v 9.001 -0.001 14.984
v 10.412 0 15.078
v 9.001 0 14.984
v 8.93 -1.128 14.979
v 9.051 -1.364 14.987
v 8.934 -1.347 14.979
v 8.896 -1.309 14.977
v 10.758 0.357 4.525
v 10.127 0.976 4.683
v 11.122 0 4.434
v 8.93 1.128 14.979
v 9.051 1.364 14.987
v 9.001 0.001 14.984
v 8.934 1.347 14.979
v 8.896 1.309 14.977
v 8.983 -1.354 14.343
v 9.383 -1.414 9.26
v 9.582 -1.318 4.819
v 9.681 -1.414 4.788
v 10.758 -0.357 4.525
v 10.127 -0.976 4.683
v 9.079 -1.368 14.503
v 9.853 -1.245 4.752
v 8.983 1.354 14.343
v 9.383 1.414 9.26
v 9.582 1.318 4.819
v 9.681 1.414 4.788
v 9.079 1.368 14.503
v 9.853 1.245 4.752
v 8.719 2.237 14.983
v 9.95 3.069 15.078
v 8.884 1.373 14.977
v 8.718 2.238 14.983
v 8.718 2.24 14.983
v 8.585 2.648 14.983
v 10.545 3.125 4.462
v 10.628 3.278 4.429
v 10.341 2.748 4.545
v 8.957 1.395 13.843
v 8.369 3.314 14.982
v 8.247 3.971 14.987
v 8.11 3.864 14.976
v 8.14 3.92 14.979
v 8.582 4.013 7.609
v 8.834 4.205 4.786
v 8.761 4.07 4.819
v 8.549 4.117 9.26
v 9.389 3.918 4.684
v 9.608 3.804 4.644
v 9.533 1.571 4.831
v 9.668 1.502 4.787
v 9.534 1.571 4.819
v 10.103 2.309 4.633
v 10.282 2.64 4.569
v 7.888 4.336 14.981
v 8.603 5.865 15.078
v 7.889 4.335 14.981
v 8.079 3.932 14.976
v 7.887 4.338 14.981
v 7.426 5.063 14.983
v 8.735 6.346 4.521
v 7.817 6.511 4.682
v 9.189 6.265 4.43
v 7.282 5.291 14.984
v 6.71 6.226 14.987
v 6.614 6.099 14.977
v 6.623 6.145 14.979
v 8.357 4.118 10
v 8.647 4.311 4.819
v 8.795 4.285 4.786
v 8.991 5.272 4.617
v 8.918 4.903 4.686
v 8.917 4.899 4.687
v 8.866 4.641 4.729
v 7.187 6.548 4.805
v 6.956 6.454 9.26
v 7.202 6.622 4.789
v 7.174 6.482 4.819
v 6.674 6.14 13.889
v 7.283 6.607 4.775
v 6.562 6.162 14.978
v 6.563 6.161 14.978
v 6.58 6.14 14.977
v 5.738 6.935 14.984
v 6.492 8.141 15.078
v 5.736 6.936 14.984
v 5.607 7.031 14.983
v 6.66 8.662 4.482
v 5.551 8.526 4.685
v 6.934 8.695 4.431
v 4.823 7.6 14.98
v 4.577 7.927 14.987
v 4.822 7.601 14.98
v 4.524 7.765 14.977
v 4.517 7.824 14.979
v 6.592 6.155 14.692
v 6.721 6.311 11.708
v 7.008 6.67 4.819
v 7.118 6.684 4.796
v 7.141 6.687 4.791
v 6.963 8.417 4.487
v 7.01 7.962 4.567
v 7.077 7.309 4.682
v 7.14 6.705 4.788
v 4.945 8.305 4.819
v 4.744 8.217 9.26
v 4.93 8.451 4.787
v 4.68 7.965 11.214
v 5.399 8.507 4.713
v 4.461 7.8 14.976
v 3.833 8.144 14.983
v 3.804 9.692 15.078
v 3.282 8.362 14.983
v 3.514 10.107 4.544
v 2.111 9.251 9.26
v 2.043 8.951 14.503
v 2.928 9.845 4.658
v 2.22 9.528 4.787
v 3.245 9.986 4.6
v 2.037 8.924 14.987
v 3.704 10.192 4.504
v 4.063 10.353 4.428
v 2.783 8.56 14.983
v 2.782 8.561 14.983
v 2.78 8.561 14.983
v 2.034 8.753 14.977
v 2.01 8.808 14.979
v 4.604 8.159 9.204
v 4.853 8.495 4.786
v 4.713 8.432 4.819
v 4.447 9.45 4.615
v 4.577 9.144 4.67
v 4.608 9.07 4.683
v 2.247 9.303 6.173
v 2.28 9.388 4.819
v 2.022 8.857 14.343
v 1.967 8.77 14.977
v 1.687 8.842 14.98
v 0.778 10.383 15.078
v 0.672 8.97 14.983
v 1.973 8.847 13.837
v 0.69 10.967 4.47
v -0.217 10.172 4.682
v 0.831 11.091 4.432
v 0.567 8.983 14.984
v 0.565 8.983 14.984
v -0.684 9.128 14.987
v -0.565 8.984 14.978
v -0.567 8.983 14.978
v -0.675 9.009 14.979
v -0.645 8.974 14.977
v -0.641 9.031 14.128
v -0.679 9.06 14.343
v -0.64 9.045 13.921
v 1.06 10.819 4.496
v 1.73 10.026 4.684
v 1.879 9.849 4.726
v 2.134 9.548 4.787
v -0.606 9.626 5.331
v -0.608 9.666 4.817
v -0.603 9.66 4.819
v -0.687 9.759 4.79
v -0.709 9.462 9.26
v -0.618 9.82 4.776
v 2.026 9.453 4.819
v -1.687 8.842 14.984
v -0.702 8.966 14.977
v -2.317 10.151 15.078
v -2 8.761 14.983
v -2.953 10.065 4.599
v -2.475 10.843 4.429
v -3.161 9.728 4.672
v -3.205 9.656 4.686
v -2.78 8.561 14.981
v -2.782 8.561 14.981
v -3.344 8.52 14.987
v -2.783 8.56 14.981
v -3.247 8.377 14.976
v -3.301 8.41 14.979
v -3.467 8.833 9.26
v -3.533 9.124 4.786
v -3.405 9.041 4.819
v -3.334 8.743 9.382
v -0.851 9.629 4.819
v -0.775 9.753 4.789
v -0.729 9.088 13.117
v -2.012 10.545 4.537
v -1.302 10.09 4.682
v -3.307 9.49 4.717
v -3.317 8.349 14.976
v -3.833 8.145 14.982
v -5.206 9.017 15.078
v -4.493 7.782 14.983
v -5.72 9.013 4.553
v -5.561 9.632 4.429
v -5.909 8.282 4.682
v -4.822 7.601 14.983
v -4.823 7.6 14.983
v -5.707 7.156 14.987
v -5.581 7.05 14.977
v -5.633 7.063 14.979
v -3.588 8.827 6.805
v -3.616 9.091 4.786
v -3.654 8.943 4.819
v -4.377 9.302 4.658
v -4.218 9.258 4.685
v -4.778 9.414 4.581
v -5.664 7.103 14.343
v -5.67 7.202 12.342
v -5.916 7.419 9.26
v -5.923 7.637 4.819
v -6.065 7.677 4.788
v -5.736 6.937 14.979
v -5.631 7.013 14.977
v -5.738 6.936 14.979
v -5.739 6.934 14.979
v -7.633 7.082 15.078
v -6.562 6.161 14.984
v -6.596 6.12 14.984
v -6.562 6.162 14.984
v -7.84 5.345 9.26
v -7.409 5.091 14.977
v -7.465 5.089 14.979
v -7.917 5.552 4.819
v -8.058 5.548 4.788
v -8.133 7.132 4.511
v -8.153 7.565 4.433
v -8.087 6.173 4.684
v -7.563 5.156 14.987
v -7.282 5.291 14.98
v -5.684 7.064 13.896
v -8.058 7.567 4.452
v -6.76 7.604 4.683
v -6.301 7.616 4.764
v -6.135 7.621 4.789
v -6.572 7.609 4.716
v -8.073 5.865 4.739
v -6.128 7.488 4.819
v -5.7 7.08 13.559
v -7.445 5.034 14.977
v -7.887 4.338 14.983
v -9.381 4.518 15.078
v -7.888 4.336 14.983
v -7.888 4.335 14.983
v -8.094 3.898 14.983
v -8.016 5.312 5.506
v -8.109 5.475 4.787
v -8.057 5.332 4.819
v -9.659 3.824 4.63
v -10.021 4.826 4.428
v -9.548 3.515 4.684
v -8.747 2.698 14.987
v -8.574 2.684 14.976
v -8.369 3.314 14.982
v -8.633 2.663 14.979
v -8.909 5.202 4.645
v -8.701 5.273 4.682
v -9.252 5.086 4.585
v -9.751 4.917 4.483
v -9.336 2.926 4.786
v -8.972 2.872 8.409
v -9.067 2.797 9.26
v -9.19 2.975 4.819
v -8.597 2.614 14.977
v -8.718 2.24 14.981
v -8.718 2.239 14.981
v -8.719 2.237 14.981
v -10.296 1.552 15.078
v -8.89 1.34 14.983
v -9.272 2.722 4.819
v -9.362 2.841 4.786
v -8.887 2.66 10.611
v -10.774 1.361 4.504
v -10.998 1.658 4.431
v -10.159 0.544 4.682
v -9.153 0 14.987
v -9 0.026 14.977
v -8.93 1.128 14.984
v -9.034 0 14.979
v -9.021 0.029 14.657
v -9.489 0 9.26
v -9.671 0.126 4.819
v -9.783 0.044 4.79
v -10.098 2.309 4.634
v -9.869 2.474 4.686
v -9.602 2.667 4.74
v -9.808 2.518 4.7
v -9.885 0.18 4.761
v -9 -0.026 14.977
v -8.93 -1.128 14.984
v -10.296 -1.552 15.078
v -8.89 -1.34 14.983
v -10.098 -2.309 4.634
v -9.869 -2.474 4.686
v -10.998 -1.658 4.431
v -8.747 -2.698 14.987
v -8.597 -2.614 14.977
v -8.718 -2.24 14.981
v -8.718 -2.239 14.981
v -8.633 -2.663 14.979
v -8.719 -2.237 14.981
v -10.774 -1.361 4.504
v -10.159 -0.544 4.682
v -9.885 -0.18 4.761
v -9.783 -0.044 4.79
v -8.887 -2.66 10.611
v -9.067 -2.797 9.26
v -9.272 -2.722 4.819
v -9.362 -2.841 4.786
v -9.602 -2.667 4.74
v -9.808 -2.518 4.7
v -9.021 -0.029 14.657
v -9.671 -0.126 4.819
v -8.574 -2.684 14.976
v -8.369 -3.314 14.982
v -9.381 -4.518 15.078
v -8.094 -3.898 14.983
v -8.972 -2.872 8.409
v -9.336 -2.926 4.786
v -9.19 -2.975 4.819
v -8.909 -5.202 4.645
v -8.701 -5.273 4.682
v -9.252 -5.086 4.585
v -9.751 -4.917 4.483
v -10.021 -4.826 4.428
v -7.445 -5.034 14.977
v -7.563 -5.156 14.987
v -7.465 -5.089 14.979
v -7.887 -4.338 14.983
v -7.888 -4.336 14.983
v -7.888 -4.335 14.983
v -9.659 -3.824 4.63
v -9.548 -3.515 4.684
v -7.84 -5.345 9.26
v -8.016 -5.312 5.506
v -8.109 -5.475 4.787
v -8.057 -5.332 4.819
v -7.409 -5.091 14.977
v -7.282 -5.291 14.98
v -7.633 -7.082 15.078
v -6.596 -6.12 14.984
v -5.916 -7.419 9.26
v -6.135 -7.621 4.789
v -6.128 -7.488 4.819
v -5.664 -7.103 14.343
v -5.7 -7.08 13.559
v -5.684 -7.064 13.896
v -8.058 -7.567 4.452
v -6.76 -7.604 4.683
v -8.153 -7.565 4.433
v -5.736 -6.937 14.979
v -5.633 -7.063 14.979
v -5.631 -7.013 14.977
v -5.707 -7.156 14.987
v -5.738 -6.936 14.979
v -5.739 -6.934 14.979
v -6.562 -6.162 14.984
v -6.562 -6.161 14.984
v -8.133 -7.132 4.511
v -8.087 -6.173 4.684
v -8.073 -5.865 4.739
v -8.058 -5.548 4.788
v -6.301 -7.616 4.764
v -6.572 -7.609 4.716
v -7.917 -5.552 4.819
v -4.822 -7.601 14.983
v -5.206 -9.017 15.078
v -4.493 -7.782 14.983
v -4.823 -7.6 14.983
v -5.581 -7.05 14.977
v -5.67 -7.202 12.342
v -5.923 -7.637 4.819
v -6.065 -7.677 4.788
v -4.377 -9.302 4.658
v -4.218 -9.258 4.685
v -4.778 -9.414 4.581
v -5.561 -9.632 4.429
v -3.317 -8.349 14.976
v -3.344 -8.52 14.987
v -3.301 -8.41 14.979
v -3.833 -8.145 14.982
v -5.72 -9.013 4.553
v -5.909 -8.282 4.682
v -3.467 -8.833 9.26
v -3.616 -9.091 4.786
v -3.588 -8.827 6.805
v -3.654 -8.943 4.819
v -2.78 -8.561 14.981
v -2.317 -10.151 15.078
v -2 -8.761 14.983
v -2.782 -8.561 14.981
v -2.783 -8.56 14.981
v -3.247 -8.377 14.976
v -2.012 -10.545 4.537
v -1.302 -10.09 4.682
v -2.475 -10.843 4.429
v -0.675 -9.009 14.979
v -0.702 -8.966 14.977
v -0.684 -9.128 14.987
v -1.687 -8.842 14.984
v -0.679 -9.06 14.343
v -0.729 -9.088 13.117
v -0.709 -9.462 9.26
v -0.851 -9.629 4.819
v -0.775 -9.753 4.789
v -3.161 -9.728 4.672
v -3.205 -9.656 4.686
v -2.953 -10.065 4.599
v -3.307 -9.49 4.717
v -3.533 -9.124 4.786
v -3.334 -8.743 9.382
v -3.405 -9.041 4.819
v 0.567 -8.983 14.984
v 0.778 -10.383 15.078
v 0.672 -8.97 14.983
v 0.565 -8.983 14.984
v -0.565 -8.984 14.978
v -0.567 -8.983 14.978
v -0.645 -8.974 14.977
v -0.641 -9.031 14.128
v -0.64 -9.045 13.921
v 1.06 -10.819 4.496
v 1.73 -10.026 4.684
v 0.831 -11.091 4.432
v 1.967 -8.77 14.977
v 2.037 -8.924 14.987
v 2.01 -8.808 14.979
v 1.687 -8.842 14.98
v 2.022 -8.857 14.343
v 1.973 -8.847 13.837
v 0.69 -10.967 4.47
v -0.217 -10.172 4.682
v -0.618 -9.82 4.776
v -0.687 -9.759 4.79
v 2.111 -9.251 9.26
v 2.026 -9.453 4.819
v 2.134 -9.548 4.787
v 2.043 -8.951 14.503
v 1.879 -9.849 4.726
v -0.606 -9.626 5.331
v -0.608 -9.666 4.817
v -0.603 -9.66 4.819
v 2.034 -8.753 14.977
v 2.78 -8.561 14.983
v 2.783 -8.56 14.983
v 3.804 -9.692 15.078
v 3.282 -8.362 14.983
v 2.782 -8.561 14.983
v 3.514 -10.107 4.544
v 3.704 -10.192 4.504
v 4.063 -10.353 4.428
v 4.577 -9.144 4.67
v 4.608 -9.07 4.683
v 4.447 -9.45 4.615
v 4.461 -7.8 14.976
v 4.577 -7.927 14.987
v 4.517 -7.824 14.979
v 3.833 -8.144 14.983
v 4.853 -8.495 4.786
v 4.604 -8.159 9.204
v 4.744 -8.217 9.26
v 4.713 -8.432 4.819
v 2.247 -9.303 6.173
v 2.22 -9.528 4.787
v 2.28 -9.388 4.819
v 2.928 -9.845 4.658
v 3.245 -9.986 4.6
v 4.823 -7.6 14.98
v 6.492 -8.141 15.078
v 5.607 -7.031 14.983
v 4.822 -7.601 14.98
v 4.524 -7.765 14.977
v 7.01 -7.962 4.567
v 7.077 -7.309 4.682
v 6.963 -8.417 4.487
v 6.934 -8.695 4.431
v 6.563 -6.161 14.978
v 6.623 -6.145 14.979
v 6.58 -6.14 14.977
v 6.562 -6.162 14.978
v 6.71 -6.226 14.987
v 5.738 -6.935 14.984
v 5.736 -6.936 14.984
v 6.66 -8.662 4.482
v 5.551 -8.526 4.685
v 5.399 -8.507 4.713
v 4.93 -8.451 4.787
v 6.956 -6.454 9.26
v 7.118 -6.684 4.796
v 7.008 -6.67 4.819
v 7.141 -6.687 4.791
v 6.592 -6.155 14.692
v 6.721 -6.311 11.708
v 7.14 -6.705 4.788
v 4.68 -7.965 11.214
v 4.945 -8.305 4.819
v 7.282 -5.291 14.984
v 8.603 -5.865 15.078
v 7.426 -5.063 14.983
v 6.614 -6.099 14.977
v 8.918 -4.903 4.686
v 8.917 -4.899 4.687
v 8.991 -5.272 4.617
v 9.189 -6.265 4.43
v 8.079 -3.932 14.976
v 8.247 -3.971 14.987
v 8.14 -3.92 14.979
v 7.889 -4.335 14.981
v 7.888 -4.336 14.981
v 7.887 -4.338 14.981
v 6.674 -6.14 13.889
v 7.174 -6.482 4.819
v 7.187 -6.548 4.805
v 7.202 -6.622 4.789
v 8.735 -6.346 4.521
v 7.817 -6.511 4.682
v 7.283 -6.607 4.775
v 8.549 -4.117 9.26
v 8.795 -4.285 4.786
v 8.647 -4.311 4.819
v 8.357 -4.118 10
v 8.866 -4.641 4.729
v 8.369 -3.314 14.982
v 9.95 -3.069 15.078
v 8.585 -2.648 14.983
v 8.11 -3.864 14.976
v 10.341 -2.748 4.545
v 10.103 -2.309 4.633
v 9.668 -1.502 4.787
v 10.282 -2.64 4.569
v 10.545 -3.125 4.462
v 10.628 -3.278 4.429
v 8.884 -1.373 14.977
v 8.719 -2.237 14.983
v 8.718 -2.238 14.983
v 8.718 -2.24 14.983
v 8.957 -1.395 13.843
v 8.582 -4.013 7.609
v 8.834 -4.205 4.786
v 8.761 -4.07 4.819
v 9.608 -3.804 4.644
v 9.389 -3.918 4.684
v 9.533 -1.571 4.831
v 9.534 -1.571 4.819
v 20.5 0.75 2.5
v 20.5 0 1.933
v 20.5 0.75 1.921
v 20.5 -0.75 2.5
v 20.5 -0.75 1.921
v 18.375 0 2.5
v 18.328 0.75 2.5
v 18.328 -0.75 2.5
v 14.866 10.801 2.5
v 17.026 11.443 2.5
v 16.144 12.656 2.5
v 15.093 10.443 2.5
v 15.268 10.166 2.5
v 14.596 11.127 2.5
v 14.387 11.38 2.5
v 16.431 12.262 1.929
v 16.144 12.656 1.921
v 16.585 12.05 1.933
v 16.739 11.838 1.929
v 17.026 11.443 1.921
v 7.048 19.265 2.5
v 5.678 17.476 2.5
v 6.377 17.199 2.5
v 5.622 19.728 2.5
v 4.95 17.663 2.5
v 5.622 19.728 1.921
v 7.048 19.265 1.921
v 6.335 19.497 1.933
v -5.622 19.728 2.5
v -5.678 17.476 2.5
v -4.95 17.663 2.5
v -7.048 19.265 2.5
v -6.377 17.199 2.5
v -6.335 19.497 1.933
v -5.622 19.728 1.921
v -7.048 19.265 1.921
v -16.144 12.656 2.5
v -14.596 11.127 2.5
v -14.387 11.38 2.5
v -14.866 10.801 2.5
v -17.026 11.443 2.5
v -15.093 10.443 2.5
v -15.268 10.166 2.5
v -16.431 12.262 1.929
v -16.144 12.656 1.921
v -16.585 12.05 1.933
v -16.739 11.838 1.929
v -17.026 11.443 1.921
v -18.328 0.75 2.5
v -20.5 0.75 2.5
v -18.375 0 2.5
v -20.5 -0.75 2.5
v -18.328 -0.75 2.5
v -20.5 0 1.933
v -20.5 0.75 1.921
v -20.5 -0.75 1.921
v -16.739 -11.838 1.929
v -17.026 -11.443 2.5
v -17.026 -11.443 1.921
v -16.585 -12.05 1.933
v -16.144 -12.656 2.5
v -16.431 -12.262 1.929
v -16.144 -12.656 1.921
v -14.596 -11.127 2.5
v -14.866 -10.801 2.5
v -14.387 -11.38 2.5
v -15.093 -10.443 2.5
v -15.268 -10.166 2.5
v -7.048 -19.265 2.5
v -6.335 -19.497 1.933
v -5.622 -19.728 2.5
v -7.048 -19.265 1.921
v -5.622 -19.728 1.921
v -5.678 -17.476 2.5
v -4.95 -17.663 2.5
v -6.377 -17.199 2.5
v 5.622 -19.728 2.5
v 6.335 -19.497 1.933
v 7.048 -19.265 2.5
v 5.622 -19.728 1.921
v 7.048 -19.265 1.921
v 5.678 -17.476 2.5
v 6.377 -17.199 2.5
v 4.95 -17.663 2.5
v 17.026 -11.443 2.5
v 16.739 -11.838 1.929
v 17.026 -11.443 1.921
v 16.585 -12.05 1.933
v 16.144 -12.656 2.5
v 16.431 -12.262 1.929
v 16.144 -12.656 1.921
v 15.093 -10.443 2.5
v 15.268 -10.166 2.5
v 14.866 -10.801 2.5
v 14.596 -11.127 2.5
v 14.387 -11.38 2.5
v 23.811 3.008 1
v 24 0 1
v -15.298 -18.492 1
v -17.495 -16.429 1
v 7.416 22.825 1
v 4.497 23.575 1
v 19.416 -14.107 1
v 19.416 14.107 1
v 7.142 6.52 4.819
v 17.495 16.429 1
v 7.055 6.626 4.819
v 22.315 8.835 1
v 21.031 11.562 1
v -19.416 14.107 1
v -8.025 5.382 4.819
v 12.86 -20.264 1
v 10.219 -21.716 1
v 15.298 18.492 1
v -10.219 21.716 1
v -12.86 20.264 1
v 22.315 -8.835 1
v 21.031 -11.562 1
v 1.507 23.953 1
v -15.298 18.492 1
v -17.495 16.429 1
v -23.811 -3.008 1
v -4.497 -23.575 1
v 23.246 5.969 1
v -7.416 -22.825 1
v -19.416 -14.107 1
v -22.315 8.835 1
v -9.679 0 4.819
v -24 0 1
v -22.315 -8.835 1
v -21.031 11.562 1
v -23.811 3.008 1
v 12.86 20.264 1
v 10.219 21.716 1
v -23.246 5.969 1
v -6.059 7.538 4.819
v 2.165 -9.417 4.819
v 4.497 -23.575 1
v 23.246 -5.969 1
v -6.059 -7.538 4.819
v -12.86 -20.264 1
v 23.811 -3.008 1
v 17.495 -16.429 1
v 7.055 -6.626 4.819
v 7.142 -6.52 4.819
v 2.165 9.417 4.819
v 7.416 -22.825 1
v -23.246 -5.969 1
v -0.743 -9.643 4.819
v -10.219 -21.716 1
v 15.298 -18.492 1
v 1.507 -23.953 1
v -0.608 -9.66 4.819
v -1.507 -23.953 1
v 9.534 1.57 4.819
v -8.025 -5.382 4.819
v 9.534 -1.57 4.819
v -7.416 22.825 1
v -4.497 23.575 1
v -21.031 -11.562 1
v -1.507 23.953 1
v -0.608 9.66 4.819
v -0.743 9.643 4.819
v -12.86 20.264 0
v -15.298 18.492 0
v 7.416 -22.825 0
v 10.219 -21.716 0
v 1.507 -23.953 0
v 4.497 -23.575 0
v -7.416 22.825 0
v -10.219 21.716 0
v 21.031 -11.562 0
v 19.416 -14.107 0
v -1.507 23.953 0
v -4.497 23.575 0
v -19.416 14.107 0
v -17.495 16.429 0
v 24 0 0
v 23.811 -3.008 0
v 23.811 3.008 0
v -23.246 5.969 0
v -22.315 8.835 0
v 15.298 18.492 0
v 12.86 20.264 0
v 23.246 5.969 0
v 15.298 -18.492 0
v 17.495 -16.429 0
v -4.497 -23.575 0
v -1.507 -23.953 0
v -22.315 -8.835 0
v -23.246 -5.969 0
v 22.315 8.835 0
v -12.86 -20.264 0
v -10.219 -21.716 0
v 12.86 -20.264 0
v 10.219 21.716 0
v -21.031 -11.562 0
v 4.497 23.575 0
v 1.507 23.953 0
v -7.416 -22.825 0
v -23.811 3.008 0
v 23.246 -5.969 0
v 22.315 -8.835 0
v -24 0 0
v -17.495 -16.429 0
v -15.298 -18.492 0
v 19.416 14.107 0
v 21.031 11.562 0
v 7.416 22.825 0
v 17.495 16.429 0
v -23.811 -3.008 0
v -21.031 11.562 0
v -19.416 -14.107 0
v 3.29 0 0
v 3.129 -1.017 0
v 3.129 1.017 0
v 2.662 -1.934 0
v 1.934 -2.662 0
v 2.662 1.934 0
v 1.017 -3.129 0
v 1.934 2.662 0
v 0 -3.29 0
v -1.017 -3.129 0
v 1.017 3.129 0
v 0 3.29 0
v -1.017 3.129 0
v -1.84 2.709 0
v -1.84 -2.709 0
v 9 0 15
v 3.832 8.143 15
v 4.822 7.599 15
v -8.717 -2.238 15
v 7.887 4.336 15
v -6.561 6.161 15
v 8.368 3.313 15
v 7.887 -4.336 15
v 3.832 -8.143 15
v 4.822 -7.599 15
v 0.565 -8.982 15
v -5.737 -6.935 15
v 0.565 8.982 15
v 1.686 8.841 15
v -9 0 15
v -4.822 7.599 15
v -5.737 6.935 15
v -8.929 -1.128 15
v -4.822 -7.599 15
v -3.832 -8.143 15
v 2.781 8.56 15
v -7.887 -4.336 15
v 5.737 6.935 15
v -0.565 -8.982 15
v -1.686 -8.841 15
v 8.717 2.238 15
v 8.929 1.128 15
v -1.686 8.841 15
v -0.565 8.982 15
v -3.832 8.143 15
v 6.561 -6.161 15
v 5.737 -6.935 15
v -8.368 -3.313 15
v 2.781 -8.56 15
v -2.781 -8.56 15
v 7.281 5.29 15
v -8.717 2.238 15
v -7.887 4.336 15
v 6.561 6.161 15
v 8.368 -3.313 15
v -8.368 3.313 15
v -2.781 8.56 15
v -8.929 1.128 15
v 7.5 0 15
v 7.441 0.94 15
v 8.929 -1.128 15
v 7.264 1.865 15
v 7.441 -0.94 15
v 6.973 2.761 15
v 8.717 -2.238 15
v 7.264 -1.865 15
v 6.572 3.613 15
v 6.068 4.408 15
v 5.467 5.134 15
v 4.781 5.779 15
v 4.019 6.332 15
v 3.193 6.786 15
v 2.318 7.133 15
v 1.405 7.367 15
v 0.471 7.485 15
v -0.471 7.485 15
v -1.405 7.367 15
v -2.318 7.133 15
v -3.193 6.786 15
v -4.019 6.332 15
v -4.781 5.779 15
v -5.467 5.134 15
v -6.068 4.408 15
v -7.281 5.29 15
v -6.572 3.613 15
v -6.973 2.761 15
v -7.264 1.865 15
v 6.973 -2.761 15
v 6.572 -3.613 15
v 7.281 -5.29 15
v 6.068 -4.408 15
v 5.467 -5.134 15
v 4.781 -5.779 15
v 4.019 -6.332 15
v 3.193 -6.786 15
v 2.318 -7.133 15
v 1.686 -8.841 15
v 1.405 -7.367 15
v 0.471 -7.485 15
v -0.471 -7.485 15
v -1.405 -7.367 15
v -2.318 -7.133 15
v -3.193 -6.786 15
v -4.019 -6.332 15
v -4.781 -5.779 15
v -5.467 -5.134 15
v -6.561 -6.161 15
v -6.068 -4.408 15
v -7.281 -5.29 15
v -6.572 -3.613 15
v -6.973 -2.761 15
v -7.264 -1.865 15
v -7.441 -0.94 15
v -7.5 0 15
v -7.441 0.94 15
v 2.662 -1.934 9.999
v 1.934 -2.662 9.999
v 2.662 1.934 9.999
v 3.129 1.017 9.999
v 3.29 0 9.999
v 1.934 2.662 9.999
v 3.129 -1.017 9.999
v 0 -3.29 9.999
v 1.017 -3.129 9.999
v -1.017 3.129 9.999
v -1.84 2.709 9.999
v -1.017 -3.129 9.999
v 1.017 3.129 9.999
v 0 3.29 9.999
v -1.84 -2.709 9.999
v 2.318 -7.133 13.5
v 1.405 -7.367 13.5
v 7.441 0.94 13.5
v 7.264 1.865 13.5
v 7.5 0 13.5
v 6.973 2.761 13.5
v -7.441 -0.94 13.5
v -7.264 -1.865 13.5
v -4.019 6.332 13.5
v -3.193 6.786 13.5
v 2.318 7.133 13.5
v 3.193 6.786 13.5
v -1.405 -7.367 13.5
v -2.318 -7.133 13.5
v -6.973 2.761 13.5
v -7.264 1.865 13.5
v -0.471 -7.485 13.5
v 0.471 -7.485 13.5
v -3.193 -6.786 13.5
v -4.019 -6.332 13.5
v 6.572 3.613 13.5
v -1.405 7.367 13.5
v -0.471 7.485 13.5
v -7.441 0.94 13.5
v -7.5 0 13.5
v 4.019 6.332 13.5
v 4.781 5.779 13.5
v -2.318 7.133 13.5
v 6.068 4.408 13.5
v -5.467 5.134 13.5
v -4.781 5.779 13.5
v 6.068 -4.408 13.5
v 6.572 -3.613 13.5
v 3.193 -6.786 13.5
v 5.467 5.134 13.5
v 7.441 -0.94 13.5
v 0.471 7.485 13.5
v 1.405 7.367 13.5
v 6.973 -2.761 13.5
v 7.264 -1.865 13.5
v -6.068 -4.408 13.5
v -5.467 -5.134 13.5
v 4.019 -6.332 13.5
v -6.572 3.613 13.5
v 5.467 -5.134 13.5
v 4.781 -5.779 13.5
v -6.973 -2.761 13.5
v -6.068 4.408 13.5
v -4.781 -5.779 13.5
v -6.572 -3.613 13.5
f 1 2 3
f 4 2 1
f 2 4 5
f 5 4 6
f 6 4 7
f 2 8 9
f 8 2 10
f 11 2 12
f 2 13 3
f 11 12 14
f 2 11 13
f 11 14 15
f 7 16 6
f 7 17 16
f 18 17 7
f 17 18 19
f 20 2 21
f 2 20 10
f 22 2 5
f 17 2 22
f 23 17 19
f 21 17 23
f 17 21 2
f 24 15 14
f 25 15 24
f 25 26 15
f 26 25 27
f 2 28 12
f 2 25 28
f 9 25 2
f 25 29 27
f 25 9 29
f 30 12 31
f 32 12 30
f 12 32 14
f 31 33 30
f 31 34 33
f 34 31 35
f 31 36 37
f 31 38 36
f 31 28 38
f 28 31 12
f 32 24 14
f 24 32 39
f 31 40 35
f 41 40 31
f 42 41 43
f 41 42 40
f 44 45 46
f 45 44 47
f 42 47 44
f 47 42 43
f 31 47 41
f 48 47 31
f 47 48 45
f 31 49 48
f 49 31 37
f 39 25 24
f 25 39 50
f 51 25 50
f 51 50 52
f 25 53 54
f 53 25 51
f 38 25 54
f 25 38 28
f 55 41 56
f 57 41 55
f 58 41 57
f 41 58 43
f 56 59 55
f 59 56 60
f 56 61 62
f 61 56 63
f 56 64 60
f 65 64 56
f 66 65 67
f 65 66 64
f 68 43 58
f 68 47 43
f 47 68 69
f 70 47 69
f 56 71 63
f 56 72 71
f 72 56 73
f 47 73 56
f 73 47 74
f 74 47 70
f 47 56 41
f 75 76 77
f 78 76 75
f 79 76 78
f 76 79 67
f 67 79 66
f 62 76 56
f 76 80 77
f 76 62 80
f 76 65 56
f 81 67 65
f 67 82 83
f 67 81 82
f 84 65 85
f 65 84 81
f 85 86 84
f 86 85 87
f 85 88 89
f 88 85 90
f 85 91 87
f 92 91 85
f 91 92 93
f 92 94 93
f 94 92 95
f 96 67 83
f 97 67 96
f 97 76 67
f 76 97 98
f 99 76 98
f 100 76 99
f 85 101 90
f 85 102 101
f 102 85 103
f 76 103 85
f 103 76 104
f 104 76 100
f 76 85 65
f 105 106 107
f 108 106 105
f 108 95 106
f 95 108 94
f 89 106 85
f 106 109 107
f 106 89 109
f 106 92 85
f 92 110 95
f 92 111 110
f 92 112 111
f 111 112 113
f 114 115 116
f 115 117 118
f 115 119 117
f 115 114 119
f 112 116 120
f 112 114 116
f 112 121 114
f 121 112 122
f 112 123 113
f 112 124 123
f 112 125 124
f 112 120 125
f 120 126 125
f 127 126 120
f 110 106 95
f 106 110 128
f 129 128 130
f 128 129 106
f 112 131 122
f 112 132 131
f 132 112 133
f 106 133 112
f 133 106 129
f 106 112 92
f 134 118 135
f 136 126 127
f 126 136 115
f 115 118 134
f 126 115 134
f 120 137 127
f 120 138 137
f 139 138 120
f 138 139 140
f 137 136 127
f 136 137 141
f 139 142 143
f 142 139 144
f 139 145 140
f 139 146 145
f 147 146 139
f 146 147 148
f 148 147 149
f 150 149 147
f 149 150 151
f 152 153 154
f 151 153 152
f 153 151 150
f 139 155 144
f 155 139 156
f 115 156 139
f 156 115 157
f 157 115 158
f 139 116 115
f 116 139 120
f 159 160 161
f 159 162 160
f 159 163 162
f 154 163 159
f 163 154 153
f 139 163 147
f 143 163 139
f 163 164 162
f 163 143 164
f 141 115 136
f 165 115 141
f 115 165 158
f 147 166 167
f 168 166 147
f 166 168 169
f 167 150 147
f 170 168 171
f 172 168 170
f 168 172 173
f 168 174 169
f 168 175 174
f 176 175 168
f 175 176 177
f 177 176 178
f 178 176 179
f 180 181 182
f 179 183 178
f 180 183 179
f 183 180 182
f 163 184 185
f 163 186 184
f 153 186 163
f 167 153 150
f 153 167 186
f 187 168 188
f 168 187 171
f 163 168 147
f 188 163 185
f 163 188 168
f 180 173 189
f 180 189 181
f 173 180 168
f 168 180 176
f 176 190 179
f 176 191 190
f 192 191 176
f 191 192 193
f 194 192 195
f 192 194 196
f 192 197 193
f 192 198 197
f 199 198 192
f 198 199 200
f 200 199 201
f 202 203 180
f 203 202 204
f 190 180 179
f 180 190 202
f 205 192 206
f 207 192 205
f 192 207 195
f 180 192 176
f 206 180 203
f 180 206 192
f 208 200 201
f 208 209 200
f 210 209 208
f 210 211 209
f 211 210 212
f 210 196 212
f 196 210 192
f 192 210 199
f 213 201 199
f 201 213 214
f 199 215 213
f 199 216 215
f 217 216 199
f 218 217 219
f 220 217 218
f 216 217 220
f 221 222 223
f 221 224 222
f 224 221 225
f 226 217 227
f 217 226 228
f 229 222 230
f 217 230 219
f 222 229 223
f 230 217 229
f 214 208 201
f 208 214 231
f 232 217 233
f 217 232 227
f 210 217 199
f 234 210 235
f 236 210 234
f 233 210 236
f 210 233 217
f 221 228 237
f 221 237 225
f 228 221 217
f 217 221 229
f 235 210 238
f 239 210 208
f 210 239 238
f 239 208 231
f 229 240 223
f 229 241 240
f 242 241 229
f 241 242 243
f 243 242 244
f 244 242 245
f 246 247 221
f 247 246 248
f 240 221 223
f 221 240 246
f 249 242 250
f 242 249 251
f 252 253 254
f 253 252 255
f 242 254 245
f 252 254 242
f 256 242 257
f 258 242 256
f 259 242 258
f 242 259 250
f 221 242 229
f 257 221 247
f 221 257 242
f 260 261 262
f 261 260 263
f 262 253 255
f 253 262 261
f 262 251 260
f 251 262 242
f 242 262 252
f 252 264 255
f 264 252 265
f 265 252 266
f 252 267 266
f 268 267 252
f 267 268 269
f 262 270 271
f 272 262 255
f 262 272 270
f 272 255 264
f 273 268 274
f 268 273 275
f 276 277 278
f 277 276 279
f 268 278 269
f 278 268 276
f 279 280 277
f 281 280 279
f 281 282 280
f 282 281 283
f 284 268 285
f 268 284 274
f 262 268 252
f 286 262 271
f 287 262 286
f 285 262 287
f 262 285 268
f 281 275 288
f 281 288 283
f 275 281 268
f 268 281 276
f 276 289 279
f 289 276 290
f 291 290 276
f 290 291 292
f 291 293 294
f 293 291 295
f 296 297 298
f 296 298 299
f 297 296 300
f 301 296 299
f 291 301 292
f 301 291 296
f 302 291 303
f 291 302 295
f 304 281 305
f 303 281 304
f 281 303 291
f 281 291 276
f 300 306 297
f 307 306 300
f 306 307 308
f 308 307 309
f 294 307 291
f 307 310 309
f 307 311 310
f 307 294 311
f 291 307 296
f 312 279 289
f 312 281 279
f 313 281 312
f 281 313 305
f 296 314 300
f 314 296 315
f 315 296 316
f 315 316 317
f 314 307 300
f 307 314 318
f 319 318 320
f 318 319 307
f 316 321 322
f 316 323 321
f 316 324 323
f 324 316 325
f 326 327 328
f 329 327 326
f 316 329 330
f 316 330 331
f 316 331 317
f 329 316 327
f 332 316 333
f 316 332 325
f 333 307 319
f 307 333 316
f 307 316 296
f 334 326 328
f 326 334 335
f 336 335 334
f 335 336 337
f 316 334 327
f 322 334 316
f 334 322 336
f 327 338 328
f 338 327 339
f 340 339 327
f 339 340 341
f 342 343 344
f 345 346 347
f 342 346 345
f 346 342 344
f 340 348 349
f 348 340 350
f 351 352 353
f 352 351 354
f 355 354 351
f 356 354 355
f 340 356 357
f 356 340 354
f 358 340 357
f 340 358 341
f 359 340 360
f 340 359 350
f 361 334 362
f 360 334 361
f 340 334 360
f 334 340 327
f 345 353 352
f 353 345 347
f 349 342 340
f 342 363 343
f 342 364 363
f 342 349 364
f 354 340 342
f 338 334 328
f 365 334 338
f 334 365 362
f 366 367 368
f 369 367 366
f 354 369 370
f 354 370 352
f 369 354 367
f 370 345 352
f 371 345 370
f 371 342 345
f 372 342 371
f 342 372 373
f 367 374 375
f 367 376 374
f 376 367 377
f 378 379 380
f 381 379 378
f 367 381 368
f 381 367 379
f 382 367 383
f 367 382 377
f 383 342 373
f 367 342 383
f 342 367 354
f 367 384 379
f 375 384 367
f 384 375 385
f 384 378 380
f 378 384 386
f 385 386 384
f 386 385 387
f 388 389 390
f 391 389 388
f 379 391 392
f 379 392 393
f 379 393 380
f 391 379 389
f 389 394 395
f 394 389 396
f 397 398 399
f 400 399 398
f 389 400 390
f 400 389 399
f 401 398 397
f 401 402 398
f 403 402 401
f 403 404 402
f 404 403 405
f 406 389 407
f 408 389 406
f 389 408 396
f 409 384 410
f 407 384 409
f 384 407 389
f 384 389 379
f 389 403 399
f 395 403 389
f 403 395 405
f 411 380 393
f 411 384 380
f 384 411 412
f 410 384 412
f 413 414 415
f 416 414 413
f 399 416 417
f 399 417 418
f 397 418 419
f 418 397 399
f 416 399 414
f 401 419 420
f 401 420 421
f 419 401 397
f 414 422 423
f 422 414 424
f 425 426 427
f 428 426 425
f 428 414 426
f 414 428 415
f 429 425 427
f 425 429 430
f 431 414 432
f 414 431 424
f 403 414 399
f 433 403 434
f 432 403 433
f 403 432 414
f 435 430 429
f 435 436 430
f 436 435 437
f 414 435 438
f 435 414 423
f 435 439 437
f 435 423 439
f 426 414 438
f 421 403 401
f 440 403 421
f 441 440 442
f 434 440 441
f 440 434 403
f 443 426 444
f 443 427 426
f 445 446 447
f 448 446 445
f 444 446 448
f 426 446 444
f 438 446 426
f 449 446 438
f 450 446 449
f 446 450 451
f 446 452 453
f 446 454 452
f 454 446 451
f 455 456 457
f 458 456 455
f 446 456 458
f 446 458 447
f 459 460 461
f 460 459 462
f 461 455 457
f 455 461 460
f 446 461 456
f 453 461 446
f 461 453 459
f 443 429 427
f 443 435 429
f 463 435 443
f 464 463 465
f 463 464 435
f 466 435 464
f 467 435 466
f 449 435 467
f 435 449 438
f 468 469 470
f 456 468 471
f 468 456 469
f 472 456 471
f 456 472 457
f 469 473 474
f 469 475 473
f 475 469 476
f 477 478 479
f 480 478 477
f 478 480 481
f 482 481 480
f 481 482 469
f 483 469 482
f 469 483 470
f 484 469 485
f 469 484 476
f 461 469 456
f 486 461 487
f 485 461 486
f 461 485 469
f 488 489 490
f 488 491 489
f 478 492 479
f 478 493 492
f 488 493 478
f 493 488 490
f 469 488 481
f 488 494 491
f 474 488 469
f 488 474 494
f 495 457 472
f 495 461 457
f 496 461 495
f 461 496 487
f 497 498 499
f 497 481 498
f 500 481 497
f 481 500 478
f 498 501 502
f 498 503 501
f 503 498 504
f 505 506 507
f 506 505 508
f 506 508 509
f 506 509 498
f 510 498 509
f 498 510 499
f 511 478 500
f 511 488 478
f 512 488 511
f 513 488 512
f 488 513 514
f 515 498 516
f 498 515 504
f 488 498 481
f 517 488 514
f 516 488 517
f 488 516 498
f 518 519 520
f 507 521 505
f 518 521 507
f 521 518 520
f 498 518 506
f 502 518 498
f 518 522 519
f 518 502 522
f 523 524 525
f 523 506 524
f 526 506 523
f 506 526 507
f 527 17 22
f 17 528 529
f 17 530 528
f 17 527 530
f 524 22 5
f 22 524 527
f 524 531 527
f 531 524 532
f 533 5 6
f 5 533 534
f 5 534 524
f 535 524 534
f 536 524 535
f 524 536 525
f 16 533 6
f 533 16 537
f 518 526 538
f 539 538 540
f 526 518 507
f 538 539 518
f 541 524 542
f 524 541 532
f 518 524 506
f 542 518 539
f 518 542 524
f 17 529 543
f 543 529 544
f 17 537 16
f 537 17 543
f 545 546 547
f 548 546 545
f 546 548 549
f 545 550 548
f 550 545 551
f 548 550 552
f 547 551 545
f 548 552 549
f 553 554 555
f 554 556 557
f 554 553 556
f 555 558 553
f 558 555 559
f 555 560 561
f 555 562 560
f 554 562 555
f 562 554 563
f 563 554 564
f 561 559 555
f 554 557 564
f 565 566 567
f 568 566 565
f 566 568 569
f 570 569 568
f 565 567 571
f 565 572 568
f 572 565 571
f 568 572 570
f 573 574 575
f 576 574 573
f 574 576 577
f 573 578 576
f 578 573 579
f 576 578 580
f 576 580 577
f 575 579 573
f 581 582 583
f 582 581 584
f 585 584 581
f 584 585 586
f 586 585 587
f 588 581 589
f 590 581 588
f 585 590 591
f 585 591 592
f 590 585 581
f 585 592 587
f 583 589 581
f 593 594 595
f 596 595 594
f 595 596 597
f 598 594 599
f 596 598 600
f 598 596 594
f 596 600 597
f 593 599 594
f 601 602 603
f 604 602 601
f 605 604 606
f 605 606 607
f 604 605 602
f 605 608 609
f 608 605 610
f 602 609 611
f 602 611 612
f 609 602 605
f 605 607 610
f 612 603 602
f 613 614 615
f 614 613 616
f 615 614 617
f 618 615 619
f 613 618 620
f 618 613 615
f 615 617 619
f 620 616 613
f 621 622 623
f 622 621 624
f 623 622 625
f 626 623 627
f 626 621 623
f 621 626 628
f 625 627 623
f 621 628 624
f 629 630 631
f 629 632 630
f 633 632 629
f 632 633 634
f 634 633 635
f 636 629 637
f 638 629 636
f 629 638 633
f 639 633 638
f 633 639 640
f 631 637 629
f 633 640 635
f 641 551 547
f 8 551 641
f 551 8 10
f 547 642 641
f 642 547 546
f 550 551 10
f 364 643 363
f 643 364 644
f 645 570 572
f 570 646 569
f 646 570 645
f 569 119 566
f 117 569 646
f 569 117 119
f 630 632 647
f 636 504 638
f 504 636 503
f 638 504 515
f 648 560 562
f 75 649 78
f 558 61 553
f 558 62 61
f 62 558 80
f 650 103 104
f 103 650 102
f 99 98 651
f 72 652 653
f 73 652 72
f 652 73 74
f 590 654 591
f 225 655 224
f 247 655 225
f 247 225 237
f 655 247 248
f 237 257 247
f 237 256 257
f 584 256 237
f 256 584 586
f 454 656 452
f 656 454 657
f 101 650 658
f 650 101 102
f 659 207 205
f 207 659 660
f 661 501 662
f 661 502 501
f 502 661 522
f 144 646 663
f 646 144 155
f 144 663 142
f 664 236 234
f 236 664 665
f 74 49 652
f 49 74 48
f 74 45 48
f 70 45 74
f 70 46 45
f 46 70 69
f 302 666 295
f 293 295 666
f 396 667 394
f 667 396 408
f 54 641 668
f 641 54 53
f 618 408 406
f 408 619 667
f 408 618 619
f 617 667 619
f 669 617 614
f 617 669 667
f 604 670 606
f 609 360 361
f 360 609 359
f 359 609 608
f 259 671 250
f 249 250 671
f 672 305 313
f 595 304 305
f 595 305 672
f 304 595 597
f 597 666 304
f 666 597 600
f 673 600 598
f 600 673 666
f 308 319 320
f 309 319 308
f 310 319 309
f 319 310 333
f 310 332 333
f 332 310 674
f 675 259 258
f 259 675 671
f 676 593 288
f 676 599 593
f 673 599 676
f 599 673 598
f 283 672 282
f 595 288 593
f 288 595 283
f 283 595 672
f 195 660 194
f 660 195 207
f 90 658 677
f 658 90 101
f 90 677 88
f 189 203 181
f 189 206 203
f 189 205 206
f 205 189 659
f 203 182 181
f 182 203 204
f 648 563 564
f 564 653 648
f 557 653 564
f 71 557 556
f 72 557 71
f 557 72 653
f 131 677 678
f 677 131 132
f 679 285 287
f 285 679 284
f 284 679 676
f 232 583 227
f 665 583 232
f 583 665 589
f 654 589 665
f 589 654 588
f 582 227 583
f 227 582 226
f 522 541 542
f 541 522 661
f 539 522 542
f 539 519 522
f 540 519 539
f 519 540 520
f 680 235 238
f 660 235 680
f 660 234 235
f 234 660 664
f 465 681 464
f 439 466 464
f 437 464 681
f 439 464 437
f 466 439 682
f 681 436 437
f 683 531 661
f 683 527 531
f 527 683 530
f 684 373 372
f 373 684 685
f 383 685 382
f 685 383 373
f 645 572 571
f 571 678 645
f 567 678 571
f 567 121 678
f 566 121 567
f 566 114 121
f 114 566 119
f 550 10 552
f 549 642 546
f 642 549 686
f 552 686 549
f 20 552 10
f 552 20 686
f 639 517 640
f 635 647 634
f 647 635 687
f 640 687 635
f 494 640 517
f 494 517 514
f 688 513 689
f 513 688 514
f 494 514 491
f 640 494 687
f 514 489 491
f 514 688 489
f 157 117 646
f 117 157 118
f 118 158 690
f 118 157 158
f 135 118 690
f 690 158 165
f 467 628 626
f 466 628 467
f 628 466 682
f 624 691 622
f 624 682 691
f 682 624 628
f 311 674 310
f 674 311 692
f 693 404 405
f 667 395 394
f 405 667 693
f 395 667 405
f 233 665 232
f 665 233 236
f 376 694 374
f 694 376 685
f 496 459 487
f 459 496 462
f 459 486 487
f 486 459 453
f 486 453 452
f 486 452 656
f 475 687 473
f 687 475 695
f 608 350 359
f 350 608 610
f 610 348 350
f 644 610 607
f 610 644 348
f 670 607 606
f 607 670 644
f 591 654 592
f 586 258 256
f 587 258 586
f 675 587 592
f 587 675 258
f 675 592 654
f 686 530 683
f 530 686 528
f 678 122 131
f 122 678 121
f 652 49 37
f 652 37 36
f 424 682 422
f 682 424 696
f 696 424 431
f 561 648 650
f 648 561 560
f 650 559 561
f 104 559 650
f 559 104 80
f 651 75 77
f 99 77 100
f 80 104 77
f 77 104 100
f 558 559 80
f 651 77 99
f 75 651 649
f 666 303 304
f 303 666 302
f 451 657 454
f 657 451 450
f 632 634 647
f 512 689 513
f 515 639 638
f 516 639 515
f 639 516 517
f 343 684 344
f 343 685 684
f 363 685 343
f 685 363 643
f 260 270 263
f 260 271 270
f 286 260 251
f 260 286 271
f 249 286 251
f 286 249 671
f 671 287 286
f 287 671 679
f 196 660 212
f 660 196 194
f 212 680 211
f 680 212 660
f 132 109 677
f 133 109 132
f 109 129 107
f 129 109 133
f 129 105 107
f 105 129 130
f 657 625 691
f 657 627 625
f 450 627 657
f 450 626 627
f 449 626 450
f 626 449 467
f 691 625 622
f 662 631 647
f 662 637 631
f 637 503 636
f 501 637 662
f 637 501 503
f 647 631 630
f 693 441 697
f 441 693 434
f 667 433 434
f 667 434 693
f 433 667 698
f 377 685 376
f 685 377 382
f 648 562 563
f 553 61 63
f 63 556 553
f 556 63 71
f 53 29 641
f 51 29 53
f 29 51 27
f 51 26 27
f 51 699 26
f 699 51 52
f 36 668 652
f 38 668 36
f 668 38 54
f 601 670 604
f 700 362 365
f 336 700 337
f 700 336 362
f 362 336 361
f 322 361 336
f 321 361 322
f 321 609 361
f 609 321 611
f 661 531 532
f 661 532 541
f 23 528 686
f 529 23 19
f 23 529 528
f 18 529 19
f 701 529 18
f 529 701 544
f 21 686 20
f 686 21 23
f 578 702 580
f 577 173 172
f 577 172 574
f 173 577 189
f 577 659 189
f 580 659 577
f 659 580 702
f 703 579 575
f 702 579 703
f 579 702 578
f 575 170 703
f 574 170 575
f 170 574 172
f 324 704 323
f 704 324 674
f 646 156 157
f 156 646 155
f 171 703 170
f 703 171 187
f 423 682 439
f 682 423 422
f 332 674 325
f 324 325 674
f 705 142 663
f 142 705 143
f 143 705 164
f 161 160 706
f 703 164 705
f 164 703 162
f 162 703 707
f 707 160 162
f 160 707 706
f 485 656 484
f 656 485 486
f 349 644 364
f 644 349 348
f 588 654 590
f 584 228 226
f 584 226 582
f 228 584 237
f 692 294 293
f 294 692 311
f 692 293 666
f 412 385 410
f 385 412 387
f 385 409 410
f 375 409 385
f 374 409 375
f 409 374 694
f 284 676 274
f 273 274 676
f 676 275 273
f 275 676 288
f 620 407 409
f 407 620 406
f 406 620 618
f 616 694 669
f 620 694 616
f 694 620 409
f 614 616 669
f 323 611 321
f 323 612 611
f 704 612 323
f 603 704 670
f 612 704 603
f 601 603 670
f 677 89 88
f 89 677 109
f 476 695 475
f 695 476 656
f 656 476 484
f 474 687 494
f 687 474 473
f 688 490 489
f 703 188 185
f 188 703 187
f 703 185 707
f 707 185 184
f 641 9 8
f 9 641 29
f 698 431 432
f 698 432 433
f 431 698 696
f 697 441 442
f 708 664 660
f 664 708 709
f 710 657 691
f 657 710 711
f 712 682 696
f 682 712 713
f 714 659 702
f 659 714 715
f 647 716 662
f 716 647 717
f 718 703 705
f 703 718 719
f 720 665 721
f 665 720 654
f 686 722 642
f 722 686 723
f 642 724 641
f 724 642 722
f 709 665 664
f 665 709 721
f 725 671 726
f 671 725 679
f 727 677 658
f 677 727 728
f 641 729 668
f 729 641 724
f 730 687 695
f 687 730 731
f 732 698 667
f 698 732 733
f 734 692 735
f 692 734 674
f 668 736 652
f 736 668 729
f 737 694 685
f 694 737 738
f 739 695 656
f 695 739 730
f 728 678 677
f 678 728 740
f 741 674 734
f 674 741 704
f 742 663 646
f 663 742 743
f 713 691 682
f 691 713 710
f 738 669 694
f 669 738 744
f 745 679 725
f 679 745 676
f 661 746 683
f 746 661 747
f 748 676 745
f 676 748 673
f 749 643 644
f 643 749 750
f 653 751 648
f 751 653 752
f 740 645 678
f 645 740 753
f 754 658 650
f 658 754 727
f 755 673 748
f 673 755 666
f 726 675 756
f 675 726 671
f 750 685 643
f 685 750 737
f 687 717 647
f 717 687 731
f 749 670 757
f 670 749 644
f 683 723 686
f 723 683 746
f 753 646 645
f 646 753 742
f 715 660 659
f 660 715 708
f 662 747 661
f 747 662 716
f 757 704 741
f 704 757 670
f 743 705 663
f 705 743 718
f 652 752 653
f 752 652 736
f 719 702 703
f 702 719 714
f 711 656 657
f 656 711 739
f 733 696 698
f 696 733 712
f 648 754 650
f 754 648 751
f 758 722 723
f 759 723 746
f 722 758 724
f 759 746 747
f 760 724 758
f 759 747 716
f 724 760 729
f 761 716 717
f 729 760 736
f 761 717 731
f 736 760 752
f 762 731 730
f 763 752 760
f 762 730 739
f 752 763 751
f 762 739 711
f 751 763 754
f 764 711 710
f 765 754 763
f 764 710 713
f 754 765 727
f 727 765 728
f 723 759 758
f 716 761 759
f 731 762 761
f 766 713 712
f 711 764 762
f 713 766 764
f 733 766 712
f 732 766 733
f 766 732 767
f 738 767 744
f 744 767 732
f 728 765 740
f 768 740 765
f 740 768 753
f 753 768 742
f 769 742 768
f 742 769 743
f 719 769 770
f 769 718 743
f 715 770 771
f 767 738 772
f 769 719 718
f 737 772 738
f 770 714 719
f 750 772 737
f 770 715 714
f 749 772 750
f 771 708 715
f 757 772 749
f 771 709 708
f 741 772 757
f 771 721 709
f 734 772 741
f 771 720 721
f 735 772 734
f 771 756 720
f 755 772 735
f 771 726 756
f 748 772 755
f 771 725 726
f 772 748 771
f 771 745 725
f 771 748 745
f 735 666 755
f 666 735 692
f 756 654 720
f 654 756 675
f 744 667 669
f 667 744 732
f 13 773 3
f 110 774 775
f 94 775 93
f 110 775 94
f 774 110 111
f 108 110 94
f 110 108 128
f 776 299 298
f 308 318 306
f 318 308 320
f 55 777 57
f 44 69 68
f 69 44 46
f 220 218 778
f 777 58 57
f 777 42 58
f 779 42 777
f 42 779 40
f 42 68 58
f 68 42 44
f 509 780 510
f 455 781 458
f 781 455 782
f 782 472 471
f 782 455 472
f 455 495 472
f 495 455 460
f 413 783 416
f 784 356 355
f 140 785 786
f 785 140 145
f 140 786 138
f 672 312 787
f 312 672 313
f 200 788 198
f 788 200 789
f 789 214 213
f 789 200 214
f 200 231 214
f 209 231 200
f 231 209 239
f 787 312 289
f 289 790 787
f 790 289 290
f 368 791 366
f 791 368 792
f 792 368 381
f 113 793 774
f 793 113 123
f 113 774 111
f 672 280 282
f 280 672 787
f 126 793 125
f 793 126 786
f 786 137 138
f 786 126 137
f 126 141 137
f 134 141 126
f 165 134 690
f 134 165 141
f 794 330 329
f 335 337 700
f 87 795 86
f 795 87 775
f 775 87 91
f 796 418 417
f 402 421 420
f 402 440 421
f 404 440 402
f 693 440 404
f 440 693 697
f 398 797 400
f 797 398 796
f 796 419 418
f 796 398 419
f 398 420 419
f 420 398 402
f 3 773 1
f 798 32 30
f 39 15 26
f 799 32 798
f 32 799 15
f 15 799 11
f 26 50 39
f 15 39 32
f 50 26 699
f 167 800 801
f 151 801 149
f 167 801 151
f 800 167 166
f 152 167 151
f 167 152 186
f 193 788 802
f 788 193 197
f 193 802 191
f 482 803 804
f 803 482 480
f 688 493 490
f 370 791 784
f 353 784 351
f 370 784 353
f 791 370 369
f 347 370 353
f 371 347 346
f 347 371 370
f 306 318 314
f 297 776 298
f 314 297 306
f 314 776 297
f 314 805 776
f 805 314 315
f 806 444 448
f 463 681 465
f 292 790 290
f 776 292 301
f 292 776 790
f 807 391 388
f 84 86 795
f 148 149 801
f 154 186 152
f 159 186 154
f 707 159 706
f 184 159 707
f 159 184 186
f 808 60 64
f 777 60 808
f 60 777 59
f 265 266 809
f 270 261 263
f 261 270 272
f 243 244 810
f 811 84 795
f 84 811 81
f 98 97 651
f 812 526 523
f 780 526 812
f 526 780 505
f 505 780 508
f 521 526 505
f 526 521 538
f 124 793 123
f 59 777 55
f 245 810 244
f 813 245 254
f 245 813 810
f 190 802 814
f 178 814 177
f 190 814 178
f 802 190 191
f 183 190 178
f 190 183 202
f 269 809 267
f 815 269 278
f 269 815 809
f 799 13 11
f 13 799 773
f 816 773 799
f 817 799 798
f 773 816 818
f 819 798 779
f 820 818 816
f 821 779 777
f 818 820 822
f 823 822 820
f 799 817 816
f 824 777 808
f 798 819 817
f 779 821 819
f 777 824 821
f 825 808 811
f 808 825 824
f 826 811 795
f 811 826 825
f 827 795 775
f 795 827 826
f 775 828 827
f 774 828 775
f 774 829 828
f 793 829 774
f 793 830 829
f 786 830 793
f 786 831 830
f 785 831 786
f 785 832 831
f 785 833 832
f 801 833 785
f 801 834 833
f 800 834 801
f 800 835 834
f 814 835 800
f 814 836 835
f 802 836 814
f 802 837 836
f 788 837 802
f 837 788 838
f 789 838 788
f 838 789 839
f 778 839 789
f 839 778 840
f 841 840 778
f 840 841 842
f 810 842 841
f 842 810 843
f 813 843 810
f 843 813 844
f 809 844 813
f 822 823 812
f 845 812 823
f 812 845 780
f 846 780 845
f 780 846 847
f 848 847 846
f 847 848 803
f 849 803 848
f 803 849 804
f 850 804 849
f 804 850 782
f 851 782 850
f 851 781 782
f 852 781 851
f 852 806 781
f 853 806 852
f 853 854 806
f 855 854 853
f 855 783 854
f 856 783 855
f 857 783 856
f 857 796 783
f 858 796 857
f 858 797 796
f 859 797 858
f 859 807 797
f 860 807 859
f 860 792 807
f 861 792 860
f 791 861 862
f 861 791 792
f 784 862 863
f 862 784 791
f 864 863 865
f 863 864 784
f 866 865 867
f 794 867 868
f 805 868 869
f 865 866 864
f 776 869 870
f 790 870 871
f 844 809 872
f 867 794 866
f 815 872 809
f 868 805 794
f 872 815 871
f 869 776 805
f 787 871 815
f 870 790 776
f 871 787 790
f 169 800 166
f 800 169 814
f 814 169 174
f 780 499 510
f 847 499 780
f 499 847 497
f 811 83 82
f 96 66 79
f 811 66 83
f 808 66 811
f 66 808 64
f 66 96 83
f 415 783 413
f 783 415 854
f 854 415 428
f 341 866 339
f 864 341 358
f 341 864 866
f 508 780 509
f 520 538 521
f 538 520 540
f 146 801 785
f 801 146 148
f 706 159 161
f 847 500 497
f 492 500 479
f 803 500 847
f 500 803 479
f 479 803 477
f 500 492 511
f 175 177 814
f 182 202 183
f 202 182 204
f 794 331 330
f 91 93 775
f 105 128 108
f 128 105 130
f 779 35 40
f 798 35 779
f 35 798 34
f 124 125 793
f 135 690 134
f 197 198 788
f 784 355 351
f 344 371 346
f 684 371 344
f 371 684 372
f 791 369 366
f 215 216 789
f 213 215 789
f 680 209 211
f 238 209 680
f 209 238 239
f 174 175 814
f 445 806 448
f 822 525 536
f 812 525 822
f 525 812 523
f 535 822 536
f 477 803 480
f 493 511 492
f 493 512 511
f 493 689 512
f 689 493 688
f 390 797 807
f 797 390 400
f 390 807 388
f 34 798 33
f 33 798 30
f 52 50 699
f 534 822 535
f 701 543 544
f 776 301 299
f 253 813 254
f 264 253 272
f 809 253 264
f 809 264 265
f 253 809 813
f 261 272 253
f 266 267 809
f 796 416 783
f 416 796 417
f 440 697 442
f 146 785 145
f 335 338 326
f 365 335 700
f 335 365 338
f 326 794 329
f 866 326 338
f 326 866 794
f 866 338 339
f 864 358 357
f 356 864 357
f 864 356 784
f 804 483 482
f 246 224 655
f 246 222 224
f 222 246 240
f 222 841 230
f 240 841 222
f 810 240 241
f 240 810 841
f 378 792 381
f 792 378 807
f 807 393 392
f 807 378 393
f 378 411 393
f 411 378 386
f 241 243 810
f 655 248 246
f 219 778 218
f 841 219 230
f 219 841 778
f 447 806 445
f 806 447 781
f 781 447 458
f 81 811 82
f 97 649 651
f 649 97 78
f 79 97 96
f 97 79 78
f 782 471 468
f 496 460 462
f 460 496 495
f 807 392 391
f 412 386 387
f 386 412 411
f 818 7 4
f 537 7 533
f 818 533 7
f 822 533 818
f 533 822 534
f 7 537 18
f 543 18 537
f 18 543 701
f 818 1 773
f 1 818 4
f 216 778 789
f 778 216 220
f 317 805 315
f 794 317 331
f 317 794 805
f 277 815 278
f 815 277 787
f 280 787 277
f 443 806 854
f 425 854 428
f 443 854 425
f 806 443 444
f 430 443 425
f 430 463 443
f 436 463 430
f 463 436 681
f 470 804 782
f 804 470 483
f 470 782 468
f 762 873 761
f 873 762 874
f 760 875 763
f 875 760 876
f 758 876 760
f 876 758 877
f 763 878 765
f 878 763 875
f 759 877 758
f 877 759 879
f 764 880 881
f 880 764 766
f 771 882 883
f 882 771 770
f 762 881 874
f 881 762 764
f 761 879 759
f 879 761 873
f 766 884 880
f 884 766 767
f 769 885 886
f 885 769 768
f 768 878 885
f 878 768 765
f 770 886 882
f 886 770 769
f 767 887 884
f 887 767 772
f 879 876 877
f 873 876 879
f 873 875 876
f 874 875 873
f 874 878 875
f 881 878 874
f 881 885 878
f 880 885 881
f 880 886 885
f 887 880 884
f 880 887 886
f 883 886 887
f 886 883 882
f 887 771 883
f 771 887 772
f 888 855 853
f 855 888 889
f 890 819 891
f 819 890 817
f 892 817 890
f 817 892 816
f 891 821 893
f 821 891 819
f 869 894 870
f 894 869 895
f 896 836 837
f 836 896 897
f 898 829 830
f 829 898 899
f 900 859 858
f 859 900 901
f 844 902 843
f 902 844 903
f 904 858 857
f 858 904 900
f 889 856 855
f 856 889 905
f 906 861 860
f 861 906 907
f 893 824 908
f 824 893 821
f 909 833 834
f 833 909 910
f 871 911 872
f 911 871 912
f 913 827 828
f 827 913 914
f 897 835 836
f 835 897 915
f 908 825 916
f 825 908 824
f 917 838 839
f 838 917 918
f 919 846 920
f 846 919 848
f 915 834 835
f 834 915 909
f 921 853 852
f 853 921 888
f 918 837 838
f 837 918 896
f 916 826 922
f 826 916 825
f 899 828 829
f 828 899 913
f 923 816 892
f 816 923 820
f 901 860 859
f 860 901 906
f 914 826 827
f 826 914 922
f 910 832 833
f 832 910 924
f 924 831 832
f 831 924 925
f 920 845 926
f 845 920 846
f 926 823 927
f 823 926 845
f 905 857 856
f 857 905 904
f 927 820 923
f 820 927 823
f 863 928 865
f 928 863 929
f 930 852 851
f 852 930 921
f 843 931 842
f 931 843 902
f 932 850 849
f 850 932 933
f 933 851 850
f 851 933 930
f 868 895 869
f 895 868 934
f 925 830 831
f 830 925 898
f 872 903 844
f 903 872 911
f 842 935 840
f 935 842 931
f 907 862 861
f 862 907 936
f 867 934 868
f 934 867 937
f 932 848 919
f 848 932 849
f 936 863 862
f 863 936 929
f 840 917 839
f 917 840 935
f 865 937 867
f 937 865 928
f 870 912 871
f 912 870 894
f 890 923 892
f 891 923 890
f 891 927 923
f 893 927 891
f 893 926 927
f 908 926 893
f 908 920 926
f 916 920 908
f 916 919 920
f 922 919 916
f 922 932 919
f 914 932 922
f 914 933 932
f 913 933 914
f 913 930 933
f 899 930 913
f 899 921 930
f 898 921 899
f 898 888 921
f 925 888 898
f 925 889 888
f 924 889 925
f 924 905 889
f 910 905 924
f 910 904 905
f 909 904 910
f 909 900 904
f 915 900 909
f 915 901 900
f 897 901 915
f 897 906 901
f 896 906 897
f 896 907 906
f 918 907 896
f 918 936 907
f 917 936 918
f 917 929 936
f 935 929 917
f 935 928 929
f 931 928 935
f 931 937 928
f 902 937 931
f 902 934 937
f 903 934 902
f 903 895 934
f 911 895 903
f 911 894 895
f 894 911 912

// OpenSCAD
//////////////////////////
// Customizable settings
//////////////////////////


// Diameter of the hole on the bottom (in mm).
HoleDiameter = 6.58;

// Depth of the hole in the bottom (in mm).  If you want the hole to go all the way through then set this to a number larger than the total height of the object.
HoleDepth = 10;

// If you want a D-shaped hole, set this to the thickness of the flat side (in mm).  Larger values for the flat make the hole smaller.
HoleFlatThickness = 1.45;

// Height (in mm).  If dome cap is selected, it is not included in height.  The shaft length is also not counted.
KnobHeight = 15;

// Diameter of base of round part of knob (in mm).  (Knurled ridges are not included in this measurement.)
KnobDiameter = 20;

// Shape of top of knob.  "Recessed" type can be painted.
CapType = 1;	// [0:Flat, 1:Recessed, 2:Dome]

// Do you want a large timer-knob style pointer?
TimerKnob=0;	// [0:No, 1:Yes]

// Would you like a divot on the top to indicate direction?
Pointer1 = 0;	// [0:No, 1:Yes]

// Would you like a line (pointer) on the front to indicate direction?
Pointer2 = 0;	// [0:No, 1:Yes]

// Do you want finger ridges around the knob?
Knurled = 1;	// [0:No, 1:Yes]

// 0 = A cylindrical knob, any other value will taper the knob.
TaperPercentage = 10;		// [0:0%, 10:10%, 20:20%, 30:30%, 40:40%, 50:50%]

// Width of "dial" ring (in mm).  Set to zero if you don't want the ring.
RingWidth = 14;

// The number of markings on the dial.  Set to zero if you don't want markings.  (RingWidth must be non-zero.)
RingMarkings = 10;

// diameter of the hole for the setscrew (in mm).  If you don't need a hole, set this to zero.
ScrewHoleDiameter = 0;

// Length of the shaft on the bottom of the knob (in mm).  If you don't want a shaft, set this value to zero.
ShaftLength = 0;

// Diameter of the shaft on the bottom of the knob (in mm).  (ShaftLength must be non-zero.)
ShaftDiameter = 10;

// Would you like a notch in the shaft?  It can be used for a press-on type knob (rather than using a setscrew).  (ShaftLength must be non-zero.)
NotchedShaft = 0;	// [0:No, 1:Yes]



//////////////////////////
//Advanced settings
//////////////////////////

RingThickness = 5*1;
DivotDepth = 1.5*1;
MarkingWidth = 1.5*1;
DistanceBetweenKnurls = 3*1;
TimerKnobConst = 1.8*1;



//////////////////////////
//Calculations
//////////////////////////

PI=3.14159265*1;
KnobMajorRadius = KnobDiameter/2;
KnobMinorRadius = KnobDiameter/2 * (1 - TaperPercentage/100);
KnobRadius = KnobMinorRadius + (KnobMajorRadius-KnobMinorRadius)/2;
KnobCircumference = PI*KnobDiameter;
Knurls = round(KnobCircumference/DistanceBetweenKnurls);
Divot=CapType;

TaperAngle=asin(KnobHeight / (sqrt(pow(KnobHeight, 2) +
		pow(KnobMajorRadius-KnobMinorRadius,2)))) - 90;

DivotRadius = KnobMinorRadius*.4;


union()
{
translate([0, 0, (ShaftLength==0)? 0 : ShaftLength-0.001])
difference()
{
union()
{
	// Primary knob cylinder
	cylinder(h=KnobHeight, r1=KnobMajorRadius, r2=KnobMinorRadius,
			$fn=50);
	
	if (Knurled)
		for (i=[0 : Knurls-1])
			rotate([0, 0, i * (360/Knurls)])
				translate([KnobRadius, 0, KnobHeight/2])
					rotate([0, TaperAngle, 0]) rotate([0, 0, 45])
						cube([2, 2, KnobHeight+.001], center=true);

 	if (RingMarkings>0)
		for (i=[0 : RingMarkings-1])
			rotate([0, 0, i * (360/RingMarkings)])
				translate([KnobMajorRadius + RingWidth/2, 0, 1])
					cube([RingWidth*.5, MarkingWidth, 3], center=true);		
	
	if (Pointer2==1)
		translate([KnobRadius, 0, KnobHeight/2-2])
			rotate([0, TaperAngle, 0])
				cube([8, 3, KnobHeight], center=true);		

	if (RingWidth>0) {
		translate([0, 0, (RingThickness-1)/2+1])
			cylinder(r1=KnobMajorRadius + RingWidth, r2=KnobMinorRadius,
					h=RingThickness-1, $fn=50, center=true);
		translate([0, 0, 0.5])
			cylinder(r1=KnobMajorRadius + RingWidth, r2=KnobMajorRadius + RingWidth,
					h=1, $fn=50, center=true);
    }
    
	if (Divot==2)
		translate([0, 0, KnobHeight])
			difference()
			{
				scale([1, 1, 0.5])
					sphere(r=KnobMinorRadius, $fn=50, center=true);

				translate([0, 0, 0-(KnobMinorRadius+.001)])
					cube([KnobMinorRadius*2.5, KnobMinorRadius*2.5,
							KnobMinorRadius*2], center=true);
			}

	if (TimerKnob==1) intersection()
		{
			translate([0, 0, 0-(KnobDiameter*TimerKnobConst) + KnobHeight])
			sphere(r=KnobDiameter*TimerKnobConst, $fn=50, center=true);		
	
			translate([0-(KnobDiameter*TimerKnobConst)*0.1, 0,
					KnobHeight/2])
				scale([1, 0.5, 1])
					cylinder(h=KnobHeight, r=(KnobDiameter*TimerKnobConst) *
							0.8, $fn=3, center=true);
		}
}

// Pointer1: Offset hemispherical divot
if (Pointer1==1)
	translate([KnobMinorRadius*.55, 0, KnobHeight + DivotRadius*.6])
		sphere(r=DivotRadius, $fn=40);

// Divot1: Centered cylynrical divot
if (Divot==1)
	translate([0, 0, KnobHeight])
		cylinder(h=DivotDepth*2, r=KnobMinorRadius-1.5, $fn=50,
				center=true);

if (ShaftLength==0)
{
	// Hole for shaft
	translate([0, 0, HoleDepth/2 - 0.001])
		difference()
		{
			cylinder(r=HoleDiameter/2, h=HoleDepth, $fn=20,
					center=true);
	
			// Flat for D-shaped hole
			translate([(0-HoleDiameter)+HoleFlatThickness, 0, 0])
				cube([HoleDiameter, HoleDiameter, HoleDepth+.001],
						center=true);
		}
	
	// Hole for setscrew
	if (ScrewHoleDiameter>0)
		translate([0 - (KnobMajorRadius+RingWidth+1)/2, 0,
				HoleDepth/2])
			rotate([0, 90, 0])
			cylinder(h=(KnobMajorRadius+RingWidth+1),
					r=ScrewHoleDiameter/2, $fn=20, center=true);
}

// Make sure bottom ends at z=0
translate([0, 0, -10])
	cube([(KnobMajorRadius+RingWidth) * 3,
			(KnobMajorRadius+RingWidth) * 3, 20], center=true);
}

if (ShaftLength>0)
	difference()
	{
		translate([0, 0, ShaftLength/2])
			cylinder(h=ShaftLength, r=ShaftDiameter/2, $fn=20,
					center=true);

		if (NotchedShaft==1)
		{
			cube([HoleDiameter/2, ShaftDiameter*2, ShaftLength],
					center=true);
		}

		// Hole for shaft
		translate([0, 0, HoleDepth/2 - 0.001])
			difference()
			{
				cylinder(r=HoleDiameter/2, h=HoleDepth, $fn=20,
						center=true);
		
				// Flat for D-shaped hole
				translate([(0-HoleDiameter)+HoleFlatThickness, 0, 0])
					cube([HoleDiameter, HoleDiameter, HoleDepth+.001],
							center=true);
			}
		
		// Hole for setscrew
		if (ScrewHoleDiameter>0)
			translate([0 - (KnobMajorRadius+RingWidth+1)/2, 0,
					HoleDepth/2])
				rotate([0, 90, 0])
				cylinder(h=(KnobMajorRadius+RingWidth+1),
						r=ScrewHoleDiameter/2, $fn=20, center=true);
	}
}
